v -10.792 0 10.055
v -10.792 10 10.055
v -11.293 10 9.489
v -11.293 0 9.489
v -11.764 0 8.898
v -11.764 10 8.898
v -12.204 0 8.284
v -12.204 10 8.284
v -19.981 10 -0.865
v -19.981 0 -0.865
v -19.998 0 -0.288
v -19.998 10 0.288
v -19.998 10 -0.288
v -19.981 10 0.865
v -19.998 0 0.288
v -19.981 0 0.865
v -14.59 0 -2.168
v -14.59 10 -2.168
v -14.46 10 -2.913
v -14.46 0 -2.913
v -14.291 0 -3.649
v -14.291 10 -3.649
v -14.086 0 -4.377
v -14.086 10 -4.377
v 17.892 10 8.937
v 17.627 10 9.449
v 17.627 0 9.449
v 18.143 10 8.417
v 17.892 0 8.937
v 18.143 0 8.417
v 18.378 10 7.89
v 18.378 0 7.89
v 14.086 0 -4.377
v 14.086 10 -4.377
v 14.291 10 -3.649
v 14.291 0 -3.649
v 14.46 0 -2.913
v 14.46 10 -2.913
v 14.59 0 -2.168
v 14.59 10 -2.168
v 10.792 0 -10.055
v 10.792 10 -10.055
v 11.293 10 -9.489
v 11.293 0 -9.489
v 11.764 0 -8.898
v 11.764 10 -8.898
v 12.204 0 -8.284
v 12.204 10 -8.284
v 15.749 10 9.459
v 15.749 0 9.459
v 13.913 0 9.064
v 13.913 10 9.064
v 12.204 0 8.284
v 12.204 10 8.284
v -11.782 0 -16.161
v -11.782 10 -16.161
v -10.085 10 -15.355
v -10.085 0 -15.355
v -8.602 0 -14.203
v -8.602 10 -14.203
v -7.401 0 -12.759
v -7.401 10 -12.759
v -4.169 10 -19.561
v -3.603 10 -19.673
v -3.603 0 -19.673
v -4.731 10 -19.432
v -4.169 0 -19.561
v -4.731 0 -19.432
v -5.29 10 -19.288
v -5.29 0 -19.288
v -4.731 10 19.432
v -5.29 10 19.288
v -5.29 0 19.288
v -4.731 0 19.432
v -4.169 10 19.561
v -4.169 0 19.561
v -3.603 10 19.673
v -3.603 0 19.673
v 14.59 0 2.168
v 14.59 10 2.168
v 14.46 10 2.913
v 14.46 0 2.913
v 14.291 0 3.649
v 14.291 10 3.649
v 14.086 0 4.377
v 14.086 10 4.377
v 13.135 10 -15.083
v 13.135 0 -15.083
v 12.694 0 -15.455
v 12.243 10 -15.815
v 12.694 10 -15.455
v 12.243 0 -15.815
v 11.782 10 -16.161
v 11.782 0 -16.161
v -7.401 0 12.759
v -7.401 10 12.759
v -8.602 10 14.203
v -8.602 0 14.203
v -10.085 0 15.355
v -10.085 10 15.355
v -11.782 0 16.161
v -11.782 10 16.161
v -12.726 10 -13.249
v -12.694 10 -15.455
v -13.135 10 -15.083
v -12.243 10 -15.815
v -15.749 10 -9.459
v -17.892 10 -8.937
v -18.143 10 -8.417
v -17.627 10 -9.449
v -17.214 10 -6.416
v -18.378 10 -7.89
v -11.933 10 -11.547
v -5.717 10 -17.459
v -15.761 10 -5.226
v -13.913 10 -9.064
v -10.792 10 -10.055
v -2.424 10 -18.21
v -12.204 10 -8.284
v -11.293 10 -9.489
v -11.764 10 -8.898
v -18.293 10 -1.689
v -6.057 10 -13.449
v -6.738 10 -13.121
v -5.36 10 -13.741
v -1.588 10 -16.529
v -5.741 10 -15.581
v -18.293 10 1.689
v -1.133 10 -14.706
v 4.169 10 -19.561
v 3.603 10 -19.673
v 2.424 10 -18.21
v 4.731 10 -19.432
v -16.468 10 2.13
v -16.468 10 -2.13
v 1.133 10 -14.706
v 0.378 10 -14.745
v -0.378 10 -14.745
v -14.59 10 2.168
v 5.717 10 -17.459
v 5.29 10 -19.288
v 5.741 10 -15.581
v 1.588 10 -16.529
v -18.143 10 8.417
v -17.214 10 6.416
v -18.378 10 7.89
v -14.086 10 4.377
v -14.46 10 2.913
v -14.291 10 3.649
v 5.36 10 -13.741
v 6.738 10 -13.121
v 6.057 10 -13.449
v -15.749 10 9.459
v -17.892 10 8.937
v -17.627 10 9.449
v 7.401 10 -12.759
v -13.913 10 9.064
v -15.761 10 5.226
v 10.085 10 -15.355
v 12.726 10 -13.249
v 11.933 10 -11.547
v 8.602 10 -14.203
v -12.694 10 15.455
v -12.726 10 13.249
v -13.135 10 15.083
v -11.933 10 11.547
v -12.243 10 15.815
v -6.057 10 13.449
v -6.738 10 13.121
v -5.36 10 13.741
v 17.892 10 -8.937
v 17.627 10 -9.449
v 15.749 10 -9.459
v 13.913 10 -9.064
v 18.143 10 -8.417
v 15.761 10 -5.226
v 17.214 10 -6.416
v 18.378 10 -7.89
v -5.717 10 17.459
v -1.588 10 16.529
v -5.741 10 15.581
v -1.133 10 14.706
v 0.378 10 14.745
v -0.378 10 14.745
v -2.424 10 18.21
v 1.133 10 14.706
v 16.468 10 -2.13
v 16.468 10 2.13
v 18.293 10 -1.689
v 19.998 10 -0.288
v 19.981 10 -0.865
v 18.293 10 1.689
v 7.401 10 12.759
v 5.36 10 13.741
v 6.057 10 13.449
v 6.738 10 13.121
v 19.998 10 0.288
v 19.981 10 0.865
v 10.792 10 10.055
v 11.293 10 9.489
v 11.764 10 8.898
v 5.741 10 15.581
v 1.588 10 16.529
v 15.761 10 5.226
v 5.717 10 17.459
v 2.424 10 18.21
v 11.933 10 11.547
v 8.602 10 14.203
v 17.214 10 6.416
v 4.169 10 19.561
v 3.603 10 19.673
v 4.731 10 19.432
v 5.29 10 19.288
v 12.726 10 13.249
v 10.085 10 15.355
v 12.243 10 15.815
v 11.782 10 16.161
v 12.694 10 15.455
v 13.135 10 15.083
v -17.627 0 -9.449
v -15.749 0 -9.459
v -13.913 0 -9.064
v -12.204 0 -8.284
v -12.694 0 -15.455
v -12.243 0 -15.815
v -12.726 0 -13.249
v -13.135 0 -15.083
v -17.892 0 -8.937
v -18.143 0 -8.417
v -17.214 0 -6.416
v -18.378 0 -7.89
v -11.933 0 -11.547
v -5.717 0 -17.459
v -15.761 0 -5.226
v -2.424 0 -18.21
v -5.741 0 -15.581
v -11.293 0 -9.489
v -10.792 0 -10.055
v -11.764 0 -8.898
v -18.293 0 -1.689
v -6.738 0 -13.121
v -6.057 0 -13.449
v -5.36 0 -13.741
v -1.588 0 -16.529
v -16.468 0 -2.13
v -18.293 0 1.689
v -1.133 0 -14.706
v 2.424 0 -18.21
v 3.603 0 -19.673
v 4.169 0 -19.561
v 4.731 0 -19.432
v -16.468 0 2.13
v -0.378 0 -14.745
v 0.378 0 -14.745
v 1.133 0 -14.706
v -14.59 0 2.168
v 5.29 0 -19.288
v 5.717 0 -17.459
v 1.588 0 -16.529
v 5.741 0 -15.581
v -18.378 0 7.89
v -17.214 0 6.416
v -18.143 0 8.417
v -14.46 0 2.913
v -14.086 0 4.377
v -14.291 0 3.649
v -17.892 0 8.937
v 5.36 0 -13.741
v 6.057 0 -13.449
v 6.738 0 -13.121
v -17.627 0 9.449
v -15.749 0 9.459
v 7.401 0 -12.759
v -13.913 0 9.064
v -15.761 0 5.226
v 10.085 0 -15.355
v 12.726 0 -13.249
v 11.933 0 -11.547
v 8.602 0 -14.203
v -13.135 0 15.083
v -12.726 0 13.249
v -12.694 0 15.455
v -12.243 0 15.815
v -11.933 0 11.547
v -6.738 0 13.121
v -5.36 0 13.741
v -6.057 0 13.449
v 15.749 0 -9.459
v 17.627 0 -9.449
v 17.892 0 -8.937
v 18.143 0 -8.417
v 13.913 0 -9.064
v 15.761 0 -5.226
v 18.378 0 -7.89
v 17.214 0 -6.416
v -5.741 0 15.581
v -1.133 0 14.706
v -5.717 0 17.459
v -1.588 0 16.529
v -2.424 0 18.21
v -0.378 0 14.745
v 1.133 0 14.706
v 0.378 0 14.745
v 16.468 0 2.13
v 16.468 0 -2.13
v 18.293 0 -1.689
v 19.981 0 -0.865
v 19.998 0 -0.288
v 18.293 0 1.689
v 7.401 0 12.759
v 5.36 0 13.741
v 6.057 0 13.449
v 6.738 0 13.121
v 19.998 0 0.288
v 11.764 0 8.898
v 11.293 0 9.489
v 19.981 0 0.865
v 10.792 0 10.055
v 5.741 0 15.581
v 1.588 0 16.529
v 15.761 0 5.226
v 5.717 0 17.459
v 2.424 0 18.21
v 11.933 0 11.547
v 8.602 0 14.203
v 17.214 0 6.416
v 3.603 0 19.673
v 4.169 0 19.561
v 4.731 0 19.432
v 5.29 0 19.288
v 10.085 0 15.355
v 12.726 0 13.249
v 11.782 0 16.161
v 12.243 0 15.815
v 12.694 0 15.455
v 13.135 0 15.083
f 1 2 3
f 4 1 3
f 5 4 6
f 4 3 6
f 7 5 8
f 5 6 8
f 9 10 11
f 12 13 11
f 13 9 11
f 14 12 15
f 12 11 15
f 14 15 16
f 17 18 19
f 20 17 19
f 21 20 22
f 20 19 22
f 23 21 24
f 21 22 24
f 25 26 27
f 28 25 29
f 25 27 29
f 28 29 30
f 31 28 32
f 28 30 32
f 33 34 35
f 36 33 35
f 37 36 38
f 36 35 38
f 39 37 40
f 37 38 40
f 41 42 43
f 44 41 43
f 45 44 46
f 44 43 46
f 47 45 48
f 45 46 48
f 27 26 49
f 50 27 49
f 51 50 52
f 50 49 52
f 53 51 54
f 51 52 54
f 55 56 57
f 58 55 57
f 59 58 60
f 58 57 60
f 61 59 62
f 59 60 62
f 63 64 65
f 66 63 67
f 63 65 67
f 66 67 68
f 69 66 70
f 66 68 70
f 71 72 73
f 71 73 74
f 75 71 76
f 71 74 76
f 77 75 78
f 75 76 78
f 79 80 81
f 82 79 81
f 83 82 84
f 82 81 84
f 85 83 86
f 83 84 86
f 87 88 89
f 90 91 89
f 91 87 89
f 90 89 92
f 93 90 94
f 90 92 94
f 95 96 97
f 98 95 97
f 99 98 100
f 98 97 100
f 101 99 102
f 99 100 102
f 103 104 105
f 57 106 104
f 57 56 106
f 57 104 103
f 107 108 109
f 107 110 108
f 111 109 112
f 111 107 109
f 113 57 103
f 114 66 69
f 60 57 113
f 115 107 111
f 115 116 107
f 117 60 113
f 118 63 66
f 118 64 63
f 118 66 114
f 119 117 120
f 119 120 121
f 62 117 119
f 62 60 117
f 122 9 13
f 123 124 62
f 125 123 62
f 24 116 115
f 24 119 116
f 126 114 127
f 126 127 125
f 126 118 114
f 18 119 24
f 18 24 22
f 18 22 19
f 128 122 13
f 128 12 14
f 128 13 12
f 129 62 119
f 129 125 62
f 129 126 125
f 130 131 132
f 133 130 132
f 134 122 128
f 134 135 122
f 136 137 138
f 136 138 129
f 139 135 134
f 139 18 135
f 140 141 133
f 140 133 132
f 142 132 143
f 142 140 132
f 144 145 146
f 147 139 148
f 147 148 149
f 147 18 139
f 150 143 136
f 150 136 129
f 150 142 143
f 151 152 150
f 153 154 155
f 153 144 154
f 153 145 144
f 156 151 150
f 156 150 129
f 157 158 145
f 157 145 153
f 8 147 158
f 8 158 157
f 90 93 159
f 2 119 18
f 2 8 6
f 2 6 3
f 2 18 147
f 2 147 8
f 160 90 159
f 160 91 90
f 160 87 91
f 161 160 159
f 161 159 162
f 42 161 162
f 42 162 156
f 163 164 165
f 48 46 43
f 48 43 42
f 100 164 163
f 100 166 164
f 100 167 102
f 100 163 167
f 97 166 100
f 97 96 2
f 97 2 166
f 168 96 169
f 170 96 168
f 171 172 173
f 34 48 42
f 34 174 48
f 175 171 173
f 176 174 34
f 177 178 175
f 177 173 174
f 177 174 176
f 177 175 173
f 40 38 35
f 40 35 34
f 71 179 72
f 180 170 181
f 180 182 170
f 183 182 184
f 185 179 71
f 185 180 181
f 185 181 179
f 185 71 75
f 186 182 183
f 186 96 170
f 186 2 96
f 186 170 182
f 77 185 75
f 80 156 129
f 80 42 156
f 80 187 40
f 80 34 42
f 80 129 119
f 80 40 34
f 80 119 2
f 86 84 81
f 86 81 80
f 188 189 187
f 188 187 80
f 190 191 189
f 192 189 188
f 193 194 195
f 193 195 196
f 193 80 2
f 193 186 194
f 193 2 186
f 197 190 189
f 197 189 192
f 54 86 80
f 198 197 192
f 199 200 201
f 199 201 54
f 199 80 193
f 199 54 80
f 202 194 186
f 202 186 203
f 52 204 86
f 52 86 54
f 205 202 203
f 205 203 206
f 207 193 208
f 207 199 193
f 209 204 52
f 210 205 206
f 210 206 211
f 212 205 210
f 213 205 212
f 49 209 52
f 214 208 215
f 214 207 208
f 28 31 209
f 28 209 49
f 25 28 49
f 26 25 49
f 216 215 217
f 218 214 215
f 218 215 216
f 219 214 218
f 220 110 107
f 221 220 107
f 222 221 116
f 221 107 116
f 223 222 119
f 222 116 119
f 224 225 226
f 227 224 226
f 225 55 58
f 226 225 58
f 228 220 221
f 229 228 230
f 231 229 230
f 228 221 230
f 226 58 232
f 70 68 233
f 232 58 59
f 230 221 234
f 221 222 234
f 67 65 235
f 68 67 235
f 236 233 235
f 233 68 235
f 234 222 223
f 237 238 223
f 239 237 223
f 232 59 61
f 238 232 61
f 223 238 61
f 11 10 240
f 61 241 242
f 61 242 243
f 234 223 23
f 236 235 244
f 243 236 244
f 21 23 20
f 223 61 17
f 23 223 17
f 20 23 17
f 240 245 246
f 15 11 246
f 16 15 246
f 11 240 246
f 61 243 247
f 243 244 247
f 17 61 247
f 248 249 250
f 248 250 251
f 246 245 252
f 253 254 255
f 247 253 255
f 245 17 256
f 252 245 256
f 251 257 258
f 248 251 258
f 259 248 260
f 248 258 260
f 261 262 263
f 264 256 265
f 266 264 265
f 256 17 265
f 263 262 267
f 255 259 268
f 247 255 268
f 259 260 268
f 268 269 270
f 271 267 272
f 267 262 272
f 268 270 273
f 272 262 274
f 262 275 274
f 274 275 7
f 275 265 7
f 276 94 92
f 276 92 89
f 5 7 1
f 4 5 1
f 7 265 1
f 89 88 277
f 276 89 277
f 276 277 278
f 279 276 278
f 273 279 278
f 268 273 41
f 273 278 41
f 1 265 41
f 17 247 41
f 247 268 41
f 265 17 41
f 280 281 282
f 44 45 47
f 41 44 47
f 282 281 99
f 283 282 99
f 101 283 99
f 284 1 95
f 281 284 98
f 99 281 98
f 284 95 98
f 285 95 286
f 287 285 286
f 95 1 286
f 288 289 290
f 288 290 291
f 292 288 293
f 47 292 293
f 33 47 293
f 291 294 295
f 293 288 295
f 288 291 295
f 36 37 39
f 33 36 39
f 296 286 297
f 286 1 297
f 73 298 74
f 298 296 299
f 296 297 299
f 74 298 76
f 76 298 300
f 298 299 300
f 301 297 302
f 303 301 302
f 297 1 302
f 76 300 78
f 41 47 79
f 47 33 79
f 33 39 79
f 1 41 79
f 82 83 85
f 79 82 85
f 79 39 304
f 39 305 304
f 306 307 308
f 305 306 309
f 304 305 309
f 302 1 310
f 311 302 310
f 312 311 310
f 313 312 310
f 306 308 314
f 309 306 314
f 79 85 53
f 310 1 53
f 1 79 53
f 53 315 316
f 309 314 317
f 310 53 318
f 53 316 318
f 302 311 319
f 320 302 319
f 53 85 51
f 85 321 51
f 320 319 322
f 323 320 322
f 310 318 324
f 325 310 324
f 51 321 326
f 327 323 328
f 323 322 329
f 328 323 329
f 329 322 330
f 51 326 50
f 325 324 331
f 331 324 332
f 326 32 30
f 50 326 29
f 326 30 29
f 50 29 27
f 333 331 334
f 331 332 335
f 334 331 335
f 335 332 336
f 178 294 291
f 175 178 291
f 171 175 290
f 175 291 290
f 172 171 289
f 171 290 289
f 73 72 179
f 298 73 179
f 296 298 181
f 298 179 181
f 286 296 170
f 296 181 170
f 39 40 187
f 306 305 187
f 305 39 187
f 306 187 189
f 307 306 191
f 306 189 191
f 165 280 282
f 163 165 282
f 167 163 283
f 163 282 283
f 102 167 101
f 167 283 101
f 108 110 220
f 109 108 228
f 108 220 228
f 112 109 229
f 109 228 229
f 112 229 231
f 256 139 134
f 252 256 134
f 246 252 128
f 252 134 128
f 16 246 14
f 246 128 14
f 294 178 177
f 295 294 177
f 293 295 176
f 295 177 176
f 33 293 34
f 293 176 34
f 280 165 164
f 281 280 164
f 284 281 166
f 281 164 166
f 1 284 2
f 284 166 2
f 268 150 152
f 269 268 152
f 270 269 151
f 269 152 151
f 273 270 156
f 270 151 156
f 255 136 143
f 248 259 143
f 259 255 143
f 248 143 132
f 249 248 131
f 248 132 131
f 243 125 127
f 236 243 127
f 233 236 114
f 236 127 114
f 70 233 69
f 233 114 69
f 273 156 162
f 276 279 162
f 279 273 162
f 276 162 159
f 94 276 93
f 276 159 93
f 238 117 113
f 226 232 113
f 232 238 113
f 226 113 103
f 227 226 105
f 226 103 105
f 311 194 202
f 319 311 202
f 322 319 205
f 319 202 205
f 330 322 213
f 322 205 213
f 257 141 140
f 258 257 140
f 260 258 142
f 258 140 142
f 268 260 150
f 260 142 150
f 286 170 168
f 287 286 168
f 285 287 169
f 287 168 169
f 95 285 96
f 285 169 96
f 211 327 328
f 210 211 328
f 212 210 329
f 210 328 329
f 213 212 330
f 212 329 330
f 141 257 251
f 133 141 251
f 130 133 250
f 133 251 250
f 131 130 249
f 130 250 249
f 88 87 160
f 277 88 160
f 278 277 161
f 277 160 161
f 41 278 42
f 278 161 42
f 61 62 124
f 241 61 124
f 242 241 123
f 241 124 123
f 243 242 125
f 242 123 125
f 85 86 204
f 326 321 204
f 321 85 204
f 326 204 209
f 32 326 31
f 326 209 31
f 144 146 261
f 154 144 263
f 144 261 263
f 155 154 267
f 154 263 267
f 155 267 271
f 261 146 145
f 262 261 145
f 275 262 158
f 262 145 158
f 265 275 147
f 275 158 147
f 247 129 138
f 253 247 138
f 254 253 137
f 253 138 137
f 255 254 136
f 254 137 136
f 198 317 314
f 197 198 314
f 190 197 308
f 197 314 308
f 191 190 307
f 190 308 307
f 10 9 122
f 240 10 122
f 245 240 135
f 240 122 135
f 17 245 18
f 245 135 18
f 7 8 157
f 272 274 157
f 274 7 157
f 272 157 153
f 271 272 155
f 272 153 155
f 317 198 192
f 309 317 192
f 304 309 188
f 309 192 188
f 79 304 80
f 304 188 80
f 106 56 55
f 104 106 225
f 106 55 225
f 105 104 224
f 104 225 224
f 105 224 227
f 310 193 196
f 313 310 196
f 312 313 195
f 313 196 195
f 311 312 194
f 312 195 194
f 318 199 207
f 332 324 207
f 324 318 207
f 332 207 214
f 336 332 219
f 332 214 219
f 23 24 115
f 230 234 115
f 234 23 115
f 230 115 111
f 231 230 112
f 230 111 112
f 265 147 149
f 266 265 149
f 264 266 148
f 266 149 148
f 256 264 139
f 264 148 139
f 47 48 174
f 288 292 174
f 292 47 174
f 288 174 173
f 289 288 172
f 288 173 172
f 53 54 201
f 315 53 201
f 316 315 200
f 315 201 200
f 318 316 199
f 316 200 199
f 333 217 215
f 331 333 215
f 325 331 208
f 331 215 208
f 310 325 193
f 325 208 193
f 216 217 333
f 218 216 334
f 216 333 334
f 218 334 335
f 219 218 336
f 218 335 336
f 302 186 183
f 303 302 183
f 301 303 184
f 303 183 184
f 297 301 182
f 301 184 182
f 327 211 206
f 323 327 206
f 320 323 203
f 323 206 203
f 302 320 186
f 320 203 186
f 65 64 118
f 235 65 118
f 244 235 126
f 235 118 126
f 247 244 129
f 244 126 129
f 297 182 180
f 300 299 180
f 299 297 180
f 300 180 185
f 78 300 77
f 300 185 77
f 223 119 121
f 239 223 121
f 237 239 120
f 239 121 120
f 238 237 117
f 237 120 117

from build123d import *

# Parameters (mm, degrees)
SKETCH_1_R               = 20
EXTRUDE_1_DEPTH          = 10
CUT_EXTRUDE_1_DEPTH      = 31
PATTERN_CIRCULAR_1_COUNT = 14


with BuildPart() as part:
    # 草图1 → 凸台-拉伸1 (new body)
    with BuildSketch(Plane(origin=(0, 0, 0), x_dir=(1, 0, 0), z_dir=(0, 1, 0))):
        with Locations(Location((0, 0, 0), (0, 0, 270))):
            Circle(SKETCH_1_R)
    extrude(amount=EXTRUDE_1_DEPTH)

    # 草图2 → 切除-拉伸1 (cut, symmetric)
    with BuildSketch(Plane(origin=(0, 10, 0), x_dir=(1, 0, 0), z_dir=(0, 1, 0))):
        with BuildLine():
            ThreePointArc((-1.13256244, 14.706454444), (0, 14.75), (1.13256244, 14.706454444))
            ThreePointArc((1.13256244, 14.706454444), (1.960472225, 17.392163769), (3.60273366, 19.672831778))
            ThreePointArc((3.60273366, 19.672831778), (0, 20), (-3.60273366, 19.672831778))
            ThreePointArc((-3.60273366, 19.672831778), (-1.960472225, 17.392163769), (-1.13256244, 14.706454444))
        make_face()
    cut_extrude_1 = extrude(amount=CUT_EXTRUDE_1_DEPTH, both=True, mode=Mode.SUBTRACT)

    # 阵列(圆周)1: 切除-拉伸1 ×14 about axis
    pattern_circular_1_axis = Axis((0, 0, 0), (0, 1, 0))
    for i in range(1, PATTERN_CIRCULAR_1_COUNT):
        add(cut_extrude_1.rotate(pattern_circular_1_axis, i * 360 / PATTERN_CIRCULAR_1_COUNT), mode=Mode.SUBTRACT)


solid = part.part
